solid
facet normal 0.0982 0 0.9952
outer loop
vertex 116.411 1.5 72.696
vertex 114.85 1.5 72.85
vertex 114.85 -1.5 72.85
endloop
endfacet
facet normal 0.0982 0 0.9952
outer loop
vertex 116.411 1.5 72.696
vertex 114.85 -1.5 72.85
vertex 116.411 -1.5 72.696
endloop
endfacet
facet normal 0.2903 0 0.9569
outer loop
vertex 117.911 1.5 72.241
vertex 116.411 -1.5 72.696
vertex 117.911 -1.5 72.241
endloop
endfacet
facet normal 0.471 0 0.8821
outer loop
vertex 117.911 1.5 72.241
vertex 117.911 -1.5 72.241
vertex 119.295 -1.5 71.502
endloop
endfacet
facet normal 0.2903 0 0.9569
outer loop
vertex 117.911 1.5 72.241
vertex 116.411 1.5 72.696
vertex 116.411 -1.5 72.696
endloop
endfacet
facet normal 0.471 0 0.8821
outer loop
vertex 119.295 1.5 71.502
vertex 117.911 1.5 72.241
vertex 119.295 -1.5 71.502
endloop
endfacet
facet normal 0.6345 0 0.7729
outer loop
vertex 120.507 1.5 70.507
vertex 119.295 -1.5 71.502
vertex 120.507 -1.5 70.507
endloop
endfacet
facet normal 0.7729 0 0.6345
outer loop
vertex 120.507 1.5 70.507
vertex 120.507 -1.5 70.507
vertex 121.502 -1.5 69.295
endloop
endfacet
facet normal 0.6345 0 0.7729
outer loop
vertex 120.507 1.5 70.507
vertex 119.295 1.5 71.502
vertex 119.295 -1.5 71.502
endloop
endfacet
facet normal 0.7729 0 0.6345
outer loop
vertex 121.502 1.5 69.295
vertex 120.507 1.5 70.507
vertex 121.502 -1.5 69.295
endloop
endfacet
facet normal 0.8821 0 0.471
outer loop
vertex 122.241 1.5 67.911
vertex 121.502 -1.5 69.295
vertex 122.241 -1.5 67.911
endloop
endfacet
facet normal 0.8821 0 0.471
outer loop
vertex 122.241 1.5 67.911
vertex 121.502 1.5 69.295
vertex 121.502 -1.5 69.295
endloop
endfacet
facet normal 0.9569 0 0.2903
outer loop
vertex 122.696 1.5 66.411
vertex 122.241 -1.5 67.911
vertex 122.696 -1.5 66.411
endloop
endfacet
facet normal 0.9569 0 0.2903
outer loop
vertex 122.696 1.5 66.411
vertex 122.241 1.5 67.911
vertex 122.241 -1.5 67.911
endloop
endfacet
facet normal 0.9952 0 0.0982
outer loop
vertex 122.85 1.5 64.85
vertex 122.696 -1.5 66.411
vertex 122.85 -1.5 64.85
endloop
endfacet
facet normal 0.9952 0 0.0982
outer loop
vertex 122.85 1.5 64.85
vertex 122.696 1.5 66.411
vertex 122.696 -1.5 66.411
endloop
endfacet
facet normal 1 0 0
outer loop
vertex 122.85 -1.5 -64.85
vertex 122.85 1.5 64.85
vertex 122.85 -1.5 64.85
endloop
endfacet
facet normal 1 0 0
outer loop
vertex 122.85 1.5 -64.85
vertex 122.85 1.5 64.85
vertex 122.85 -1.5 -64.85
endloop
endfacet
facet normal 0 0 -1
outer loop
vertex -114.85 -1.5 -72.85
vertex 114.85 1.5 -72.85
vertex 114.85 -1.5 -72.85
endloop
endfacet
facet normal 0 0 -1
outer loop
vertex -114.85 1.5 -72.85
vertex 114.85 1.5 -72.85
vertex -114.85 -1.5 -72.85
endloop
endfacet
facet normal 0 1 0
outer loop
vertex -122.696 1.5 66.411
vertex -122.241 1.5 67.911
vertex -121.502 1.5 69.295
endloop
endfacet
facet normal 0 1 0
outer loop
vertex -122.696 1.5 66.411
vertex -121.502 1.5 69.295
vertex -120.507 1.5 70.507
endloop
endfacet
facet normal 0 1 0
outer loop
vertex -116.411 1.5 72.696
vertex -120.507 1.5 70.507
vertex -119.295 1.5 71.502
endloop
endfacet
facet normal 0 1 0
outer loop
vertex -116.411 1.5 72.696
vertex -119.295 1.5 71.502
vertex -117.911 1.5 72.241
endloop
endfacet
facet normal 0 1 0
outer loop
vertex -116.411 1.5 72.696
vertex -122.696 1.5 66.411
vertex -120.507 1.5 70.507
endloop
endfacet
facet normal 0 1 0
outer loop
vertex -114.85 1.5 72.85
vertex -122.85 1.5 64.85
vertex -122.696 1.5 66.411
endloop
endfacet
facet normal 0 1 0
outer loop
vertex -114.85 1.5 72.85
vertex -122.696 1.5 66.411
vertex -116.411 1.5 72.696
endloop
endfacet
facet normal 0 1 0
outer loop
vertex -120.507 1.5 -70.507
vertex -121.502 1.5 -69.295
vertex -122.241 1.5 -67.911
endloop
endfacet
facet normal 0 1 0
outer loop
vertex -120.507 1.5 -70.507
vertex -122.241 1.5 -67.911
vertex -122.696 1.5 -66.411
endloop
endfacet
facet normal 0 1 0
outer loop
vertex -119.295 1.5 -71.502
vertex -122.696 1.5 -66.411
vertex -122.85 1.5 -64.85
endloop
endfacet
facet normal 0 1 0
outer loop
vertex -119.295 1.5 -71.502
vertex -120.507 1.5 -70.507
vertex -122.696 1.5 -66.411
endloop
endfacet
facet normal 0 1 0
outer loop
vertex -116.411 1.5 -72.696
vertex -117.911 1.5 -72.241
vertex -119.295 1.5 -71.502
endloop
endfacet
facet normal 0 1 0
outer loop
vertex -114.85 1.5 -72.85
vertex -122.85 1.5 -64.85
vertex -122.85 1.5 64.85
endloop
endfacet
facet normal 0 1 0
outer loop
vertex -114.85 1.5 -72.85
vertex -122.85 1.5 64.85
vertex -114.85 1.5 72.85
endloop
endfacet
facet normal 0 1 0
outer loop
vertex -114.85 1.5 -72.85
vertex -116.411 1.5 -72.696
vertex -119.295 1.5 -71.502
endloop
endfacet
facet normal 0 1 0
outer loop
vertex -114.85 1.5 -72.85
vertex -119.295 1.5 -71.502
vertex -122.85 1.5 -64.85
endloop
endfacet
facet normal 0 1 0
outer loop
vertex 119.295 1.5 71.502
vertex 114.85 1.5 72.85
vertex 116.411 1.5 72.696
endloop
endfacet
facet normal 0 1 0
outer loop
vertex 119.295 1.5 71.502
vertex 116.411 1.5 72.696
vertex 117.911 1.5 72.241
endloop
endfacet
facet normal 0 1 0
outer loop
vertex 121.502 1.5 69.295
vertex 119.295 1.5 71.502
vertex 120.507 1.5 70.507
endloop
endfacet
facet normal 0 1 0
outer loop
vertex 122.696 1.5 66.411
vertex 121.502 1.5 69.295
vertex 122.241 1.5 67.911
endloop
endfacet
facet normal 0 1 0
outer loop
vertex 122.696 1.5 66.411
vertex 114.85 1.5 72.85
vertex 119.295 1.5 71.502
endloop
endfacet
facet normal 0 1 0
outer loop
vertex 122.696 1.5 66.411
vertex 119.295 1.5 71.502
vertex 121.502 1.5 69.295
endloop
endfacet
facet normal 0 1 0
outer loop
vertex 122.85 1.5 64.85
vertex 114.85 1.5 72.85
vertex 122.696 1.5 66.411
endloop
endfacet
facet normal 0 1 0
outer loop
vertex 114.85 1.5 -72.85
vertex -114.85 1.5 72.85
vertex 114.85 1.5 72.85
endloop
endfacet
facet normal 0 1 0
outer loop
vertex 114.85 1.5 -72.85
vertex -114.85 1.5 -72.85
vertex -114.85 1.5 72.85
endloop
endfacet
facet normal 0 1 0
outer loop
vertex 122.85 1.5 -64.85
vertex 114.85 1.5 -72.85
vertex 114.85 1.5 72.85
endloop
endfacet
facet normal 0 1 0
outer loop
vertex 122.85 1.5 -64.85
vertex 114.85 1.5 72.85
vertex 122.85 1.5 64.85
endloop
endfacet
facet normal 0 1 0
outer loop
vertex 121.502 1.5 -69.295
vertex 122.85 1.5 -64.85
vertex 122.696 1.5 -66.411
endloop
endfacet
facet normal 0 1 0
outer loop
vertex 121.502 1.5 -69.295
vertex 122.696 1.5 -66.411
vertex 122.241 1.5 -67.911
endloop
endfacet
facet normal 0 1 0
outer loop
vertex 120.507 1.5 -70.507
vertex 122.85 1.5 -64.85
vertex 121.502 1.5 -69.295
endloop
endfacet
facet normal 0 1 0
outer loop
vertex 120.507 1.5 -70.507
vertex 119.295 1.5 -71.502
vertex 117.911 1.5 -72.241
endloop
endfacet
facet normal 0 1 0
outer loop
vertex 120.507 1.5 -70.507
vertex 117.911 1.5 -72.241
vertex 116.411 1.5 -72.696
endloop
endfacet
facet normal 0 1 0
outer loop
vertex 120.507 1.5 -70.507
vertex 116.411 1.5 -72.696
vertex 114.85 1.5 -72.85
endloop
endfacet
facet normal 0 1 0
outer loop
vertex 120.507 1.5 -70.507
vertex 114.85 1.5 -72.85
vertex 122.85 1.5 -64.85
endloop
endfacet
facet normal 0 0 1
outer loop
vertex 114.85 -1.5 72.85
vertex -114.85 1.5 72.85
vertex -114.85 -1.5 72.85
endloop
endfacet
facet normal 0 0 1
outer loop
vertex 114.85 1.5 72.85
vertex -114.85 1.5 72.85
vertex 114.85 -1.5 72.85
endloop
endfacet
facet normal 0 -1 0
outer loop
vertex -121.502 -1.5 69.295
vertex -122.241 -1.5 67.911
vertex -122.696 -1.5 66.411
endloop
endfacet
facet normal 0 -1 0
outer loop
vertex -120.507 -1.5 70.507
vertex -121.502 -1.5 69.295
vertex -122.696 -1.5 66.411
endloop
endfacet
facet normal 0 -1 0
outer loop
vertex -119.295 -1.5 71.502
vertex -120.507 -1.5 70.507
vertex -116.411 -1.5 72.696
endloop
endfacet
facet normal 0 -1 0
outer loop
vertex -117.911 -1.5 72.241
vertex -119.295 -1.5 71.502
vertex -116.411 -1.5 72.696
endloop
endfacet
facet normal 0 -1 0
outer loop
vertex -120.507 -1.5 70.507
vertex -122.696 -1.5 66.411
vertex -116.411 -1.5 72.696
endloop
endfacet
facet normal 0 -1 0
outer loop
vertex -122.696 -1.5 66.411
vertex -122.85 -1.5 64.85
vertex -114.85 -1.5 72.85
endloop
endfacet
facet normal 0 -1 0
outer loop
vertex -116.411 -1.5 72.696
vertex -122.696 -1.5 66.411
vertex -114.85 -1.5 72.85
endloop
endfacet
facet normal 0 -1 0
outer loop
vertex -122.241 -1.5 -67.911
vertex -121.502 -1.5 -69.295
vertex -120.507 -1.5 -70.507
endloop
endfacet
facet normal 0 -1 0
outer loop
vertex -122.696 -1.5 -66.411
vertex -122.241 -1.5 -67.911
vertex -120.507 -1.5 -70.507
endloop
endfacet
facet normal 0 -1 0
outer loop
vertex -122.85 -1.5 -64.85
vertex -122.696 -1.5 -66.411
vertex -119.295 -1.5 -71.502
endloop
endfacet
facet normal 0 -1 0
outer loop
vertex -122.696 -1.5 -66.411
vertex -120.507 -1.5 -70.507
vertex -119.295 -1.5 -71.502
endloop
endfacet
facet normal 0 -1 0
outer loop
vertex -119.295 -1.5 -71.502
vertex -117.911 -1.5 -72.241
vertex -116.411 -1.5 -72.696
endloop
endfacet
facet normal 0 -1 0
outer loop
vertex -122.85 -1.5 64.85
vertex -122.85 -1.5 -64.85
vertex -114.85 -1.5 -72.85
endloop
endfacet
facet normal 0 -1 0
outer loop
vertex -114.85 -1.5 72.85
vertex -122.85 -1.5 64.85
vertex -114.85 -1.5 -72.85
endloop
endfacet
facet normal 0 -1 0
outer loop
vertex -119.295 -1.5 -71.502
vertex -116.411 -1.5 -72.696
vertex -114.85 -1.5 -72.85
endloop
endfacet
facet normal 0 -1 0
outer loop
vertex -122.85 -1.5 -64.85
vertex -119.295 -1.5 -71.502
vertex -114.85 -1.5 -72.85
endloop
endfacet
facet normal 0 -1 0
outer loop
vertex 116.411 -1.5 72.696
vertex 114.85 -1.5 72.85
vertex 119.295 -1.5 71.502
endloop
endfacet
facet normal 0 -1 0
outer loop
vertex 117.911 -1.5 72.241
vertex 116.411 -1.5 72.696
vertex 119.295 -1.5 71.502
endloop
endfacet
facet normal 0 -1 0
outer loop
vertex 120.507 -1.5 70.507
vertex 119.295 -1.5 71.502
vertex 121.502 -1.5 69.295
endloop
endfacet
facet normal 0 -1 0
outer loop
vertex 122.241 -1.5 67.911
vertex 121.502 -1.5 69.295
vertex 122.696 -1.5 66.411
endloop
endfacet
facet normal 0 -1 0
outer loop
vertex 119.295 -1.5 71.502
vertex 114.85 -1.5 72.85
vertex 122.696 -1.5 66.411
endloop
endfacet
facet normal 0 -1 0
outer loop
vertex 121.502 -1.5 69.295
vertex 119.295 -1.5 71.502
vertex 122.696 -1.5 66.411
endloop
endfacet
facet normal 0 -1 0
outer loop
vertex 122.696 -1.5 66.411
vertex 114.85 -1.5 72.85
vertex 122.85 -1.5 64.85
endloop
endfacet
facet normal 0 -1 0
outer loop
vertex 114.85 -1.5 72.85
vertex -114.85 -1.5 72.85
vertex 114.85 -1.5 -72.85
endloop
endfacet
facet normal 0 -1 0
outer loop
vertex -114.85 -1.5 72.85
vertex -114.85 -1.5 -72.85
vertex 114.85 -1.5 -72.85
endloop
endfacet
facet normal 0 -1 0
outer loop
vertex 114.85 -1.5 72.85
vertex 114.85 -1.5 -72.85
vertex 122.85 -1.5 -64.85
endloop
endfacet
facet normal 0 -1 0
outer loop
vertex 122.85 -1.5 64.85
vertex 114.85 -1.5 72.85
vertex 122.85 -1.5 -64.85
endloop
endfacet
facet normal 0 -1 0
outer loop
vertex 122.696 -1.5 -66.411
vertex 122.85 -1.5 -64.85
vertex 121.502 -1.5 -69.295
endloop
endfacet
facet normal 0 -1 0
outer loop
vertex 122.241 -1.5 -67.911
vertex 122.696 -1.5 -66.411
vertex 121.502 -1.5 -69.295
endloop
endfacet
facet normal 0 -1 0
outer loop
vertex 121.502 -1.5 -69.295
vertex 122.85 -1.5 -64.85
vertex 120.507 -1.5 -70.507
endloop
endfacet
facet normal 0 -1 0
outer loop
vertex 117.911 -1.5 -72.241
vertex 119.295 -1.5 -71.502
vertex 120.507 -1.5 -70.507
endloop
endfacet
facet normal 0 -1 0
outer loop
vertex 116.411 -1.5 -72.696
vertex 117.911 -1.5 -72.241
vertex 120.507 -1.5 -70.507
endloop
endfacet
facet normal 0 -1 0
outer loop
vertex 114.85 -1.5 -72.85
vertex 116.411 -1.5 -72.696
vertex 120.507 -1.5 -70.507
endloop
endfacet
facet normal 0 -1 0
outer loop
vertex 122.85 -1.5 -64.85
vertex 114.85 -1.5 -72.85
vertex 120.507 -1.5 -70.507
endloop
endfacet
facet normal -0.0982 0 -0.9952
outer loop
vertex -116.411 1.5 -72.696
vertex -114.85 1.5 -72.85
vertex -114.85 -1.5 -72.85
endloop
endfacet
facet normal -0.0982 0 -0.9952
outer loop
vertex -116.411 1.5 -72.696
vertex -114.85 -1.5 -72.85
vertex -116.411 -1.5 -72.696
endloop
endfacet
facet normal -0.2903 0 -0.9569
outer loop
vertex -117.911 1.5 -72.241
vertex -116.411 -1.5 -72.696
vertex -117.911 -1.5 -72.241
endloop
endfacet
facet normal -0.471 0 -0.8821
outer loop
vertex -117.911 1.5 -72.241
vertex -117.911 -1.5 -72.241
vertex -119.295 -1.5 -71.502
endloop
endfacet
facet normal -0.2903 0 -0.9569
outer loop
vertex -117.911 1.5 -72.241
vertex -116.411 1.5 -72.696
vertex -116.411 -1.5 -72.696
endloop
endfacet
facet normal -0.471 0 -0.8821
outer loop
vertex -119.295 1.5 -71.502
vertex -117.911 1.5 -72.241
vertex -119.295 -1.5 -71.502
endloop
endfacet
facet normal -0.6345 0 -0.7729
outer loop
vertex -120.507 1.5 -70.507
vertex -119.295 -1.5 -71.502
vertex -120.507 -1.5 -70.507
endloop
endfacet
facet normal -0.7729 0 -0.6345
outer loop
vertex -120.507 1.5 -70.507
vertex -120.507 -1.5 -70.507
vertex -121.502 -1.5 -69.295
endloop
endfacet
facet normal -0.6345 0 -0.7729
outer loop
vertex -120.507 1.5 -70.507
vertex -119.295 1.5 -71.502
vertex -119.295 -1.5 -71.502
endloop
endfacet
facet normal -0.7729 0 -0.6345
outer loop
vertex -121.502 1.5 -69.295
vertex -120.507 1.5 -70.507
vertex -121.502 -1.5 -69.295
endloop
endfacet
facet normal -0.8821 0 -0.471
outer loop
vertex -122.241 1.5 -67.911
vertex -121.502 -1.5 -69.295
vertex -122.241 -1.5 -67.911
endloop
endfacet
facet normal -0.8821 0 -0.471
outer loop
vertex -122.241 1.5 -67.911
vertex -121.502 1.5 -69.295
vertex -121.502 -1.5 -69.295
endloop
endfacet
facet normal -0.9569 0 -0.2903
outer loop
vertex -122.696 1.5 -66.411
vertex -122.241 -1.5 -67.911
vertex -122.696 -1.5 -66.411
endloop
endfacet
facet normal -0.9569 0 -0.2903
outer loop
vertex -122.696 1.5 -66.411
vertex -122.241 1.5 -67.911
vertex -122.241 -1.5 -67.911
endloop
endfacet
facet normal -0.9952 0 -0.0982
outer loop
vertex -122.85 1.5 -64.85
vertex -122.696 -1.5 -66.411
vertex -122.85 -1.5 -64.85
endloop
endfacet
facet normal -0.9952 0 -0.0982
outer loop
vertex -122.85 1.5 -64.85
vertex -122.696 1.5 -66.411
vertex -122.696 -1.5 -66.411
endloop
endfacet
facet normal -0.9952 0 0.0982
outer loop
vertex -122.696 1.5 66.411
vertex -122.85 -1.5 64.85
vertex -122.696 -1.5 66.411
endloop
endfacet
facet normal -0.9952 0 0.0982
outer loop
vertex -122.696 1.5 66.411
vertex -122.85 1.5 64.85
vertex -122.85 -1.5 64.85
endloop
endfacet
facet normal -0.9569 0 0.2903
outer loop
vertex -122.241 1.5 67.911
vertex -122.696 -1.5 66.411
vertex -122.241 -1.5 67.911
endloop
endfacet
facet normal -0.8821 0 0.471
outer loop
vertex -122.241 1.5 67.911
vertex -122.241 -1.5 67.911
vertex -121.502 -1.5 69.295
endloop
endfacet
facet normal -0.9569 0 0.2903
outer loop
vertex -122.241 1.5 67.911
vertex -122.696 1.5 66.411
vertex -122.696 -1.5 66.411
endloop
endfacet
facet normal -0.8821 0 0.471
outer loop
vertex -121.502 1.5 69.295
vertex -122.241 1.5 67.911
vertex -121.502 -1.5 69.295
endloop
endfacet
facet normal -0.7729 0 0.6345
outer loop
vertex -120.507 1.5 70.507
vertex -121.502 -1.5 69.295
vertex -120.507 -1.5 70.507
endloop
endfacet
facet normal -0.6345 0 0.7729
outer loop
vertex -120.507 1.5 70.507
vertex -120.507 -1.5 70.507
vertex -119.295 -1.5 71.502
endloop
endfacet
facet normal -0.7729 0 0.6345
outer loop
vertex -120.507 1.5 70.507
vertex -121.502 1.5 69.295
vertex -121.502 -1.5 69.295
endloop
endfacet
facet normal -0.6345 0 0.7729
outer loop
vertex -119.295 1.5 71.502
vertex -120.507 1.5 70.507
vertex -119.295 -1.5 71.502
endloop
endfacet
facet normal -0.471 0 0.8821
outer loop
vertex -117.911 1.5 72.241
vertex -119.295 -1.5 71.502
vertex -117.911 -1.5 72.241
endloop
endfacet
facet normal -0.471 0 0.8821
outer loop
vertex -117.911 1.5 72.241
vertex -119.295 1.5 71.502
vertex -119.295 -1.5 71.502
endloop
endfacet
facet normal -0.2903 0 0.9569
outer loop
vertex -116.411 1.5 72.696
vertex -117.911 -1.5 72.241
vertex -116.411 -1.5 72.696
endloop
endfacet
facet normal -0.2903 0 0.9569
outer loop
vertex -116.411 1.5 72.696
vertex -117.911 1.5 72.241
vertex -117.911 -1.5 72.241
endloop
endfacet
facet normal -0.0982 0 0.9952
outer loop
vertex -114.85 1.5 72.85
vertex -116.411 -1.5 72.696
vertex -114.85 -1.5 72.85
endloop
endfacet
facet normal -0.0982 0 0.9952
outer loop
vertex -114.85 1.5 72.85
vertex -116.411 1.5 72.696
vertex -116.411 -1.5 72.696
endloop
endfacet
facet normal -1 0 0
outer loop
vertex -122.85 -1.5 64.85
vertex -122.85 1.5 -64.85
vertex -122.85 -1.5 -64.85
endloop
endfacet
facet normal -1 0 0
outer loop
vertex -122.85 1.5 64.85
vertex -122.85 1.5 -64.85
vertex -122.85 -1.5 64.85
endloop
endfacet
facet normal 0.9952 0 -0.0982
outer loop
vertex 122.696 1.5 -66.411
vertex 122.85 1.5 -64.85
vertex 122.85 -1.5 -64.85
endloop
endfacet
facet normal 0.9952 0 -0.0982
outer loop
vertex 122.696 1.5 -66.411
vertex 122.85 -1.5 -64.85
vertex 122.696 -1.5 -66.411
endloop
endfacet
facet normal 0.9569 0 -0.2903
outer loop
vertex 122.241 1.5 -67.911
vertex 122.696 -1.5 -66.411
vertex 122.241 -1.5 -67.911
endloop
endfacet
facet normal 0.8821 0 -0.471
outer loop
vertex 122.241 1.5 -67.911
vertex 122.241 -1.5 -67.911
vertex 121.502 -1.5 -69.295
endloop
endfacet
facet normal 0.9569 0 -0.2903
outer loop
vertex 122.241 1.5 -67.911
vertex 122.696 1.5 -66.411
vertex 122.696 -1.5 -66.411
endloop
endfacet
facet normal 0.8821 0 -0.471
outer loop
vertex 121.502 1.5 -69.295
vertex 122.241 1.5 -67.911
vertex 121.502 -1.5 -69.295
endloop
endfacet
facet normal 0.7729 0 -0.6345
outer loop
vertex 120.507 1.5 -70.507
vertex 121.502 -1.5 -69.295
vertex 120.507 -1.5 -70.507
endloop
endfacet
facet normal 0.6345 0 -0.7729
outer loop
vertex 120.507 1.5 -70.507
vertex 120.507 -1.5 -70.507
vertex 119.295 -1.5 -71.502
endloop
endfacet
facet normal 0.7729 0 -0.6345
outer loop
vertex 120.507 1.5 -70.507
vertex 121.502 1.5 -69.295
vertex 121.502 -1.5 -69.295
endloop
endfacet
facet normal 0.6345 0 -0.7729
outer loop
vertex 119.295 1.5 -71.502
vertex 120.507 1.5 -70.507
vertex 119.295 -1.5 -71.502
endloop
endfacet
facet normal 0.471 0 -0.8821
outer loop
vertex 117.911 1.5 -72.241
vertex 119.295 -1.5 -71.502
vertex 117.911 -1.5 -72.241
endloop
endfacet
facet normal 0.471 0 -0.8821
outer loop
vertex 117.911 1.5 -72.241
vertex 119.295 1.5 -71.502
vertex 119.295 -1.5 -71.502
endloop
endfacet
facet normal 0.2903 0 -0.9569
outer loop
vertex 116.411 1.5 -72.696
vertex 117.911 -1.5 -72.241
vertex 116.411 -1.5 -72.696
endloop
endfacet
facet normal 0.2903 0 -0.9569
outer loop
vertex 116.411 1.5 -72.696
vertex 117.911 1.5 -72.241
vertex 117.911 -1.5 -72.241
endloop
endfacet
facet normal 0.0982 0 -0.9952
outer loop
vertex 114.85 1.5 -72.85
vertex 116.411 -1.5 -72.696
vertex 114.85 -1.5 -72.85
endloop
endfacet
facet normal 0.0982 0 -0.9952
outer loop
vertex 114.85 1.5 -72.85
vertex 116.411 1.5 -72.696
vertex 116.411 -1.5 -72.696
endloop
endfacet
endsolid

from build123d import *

# Parameters (mm, degrees)
SALIENTE_EXTRUIR1_DEPTH = 1.5


with BuildPart() as part:
    # Croquis1 → Saliente-Extruir1 (new, symmetric)
    with BuildSketch(Plane(origin=(0, 0, 0), x_dir=(1, 0, 0), z_dir=(0, 1, 0))):
        with BuildLine():
            Line((-114.85, -72.85), (114.85, -72.85))
            ThreePointArc((114.85, -72.85), (120.506854249, -70.506854249), (122.85, -64.85))
            Line((122.85, -64.85), (122.85, 64.85))
            ThreePointArc((122.85, 64.85), (120.506854249, 70.506854249), (114.85, 72.85))
            Line((114.85, 72.85), (-114.85, 72.85))
            ThreePointArc((-114.85, 72.85), (-120.506854249, 70.506854249), (-122.85, 64.85))
            Line((-122.85, 64.85), (-122.85, -64.85))
            ThreePointArc((-122.85, -64.85), (-120.506854249, -70.506854249), (-114.85, -72.85))
        make_face()
    extrude(amount=SALIENTE_EXTRUIR1_DEPTH, both=True)


solid = part.part
